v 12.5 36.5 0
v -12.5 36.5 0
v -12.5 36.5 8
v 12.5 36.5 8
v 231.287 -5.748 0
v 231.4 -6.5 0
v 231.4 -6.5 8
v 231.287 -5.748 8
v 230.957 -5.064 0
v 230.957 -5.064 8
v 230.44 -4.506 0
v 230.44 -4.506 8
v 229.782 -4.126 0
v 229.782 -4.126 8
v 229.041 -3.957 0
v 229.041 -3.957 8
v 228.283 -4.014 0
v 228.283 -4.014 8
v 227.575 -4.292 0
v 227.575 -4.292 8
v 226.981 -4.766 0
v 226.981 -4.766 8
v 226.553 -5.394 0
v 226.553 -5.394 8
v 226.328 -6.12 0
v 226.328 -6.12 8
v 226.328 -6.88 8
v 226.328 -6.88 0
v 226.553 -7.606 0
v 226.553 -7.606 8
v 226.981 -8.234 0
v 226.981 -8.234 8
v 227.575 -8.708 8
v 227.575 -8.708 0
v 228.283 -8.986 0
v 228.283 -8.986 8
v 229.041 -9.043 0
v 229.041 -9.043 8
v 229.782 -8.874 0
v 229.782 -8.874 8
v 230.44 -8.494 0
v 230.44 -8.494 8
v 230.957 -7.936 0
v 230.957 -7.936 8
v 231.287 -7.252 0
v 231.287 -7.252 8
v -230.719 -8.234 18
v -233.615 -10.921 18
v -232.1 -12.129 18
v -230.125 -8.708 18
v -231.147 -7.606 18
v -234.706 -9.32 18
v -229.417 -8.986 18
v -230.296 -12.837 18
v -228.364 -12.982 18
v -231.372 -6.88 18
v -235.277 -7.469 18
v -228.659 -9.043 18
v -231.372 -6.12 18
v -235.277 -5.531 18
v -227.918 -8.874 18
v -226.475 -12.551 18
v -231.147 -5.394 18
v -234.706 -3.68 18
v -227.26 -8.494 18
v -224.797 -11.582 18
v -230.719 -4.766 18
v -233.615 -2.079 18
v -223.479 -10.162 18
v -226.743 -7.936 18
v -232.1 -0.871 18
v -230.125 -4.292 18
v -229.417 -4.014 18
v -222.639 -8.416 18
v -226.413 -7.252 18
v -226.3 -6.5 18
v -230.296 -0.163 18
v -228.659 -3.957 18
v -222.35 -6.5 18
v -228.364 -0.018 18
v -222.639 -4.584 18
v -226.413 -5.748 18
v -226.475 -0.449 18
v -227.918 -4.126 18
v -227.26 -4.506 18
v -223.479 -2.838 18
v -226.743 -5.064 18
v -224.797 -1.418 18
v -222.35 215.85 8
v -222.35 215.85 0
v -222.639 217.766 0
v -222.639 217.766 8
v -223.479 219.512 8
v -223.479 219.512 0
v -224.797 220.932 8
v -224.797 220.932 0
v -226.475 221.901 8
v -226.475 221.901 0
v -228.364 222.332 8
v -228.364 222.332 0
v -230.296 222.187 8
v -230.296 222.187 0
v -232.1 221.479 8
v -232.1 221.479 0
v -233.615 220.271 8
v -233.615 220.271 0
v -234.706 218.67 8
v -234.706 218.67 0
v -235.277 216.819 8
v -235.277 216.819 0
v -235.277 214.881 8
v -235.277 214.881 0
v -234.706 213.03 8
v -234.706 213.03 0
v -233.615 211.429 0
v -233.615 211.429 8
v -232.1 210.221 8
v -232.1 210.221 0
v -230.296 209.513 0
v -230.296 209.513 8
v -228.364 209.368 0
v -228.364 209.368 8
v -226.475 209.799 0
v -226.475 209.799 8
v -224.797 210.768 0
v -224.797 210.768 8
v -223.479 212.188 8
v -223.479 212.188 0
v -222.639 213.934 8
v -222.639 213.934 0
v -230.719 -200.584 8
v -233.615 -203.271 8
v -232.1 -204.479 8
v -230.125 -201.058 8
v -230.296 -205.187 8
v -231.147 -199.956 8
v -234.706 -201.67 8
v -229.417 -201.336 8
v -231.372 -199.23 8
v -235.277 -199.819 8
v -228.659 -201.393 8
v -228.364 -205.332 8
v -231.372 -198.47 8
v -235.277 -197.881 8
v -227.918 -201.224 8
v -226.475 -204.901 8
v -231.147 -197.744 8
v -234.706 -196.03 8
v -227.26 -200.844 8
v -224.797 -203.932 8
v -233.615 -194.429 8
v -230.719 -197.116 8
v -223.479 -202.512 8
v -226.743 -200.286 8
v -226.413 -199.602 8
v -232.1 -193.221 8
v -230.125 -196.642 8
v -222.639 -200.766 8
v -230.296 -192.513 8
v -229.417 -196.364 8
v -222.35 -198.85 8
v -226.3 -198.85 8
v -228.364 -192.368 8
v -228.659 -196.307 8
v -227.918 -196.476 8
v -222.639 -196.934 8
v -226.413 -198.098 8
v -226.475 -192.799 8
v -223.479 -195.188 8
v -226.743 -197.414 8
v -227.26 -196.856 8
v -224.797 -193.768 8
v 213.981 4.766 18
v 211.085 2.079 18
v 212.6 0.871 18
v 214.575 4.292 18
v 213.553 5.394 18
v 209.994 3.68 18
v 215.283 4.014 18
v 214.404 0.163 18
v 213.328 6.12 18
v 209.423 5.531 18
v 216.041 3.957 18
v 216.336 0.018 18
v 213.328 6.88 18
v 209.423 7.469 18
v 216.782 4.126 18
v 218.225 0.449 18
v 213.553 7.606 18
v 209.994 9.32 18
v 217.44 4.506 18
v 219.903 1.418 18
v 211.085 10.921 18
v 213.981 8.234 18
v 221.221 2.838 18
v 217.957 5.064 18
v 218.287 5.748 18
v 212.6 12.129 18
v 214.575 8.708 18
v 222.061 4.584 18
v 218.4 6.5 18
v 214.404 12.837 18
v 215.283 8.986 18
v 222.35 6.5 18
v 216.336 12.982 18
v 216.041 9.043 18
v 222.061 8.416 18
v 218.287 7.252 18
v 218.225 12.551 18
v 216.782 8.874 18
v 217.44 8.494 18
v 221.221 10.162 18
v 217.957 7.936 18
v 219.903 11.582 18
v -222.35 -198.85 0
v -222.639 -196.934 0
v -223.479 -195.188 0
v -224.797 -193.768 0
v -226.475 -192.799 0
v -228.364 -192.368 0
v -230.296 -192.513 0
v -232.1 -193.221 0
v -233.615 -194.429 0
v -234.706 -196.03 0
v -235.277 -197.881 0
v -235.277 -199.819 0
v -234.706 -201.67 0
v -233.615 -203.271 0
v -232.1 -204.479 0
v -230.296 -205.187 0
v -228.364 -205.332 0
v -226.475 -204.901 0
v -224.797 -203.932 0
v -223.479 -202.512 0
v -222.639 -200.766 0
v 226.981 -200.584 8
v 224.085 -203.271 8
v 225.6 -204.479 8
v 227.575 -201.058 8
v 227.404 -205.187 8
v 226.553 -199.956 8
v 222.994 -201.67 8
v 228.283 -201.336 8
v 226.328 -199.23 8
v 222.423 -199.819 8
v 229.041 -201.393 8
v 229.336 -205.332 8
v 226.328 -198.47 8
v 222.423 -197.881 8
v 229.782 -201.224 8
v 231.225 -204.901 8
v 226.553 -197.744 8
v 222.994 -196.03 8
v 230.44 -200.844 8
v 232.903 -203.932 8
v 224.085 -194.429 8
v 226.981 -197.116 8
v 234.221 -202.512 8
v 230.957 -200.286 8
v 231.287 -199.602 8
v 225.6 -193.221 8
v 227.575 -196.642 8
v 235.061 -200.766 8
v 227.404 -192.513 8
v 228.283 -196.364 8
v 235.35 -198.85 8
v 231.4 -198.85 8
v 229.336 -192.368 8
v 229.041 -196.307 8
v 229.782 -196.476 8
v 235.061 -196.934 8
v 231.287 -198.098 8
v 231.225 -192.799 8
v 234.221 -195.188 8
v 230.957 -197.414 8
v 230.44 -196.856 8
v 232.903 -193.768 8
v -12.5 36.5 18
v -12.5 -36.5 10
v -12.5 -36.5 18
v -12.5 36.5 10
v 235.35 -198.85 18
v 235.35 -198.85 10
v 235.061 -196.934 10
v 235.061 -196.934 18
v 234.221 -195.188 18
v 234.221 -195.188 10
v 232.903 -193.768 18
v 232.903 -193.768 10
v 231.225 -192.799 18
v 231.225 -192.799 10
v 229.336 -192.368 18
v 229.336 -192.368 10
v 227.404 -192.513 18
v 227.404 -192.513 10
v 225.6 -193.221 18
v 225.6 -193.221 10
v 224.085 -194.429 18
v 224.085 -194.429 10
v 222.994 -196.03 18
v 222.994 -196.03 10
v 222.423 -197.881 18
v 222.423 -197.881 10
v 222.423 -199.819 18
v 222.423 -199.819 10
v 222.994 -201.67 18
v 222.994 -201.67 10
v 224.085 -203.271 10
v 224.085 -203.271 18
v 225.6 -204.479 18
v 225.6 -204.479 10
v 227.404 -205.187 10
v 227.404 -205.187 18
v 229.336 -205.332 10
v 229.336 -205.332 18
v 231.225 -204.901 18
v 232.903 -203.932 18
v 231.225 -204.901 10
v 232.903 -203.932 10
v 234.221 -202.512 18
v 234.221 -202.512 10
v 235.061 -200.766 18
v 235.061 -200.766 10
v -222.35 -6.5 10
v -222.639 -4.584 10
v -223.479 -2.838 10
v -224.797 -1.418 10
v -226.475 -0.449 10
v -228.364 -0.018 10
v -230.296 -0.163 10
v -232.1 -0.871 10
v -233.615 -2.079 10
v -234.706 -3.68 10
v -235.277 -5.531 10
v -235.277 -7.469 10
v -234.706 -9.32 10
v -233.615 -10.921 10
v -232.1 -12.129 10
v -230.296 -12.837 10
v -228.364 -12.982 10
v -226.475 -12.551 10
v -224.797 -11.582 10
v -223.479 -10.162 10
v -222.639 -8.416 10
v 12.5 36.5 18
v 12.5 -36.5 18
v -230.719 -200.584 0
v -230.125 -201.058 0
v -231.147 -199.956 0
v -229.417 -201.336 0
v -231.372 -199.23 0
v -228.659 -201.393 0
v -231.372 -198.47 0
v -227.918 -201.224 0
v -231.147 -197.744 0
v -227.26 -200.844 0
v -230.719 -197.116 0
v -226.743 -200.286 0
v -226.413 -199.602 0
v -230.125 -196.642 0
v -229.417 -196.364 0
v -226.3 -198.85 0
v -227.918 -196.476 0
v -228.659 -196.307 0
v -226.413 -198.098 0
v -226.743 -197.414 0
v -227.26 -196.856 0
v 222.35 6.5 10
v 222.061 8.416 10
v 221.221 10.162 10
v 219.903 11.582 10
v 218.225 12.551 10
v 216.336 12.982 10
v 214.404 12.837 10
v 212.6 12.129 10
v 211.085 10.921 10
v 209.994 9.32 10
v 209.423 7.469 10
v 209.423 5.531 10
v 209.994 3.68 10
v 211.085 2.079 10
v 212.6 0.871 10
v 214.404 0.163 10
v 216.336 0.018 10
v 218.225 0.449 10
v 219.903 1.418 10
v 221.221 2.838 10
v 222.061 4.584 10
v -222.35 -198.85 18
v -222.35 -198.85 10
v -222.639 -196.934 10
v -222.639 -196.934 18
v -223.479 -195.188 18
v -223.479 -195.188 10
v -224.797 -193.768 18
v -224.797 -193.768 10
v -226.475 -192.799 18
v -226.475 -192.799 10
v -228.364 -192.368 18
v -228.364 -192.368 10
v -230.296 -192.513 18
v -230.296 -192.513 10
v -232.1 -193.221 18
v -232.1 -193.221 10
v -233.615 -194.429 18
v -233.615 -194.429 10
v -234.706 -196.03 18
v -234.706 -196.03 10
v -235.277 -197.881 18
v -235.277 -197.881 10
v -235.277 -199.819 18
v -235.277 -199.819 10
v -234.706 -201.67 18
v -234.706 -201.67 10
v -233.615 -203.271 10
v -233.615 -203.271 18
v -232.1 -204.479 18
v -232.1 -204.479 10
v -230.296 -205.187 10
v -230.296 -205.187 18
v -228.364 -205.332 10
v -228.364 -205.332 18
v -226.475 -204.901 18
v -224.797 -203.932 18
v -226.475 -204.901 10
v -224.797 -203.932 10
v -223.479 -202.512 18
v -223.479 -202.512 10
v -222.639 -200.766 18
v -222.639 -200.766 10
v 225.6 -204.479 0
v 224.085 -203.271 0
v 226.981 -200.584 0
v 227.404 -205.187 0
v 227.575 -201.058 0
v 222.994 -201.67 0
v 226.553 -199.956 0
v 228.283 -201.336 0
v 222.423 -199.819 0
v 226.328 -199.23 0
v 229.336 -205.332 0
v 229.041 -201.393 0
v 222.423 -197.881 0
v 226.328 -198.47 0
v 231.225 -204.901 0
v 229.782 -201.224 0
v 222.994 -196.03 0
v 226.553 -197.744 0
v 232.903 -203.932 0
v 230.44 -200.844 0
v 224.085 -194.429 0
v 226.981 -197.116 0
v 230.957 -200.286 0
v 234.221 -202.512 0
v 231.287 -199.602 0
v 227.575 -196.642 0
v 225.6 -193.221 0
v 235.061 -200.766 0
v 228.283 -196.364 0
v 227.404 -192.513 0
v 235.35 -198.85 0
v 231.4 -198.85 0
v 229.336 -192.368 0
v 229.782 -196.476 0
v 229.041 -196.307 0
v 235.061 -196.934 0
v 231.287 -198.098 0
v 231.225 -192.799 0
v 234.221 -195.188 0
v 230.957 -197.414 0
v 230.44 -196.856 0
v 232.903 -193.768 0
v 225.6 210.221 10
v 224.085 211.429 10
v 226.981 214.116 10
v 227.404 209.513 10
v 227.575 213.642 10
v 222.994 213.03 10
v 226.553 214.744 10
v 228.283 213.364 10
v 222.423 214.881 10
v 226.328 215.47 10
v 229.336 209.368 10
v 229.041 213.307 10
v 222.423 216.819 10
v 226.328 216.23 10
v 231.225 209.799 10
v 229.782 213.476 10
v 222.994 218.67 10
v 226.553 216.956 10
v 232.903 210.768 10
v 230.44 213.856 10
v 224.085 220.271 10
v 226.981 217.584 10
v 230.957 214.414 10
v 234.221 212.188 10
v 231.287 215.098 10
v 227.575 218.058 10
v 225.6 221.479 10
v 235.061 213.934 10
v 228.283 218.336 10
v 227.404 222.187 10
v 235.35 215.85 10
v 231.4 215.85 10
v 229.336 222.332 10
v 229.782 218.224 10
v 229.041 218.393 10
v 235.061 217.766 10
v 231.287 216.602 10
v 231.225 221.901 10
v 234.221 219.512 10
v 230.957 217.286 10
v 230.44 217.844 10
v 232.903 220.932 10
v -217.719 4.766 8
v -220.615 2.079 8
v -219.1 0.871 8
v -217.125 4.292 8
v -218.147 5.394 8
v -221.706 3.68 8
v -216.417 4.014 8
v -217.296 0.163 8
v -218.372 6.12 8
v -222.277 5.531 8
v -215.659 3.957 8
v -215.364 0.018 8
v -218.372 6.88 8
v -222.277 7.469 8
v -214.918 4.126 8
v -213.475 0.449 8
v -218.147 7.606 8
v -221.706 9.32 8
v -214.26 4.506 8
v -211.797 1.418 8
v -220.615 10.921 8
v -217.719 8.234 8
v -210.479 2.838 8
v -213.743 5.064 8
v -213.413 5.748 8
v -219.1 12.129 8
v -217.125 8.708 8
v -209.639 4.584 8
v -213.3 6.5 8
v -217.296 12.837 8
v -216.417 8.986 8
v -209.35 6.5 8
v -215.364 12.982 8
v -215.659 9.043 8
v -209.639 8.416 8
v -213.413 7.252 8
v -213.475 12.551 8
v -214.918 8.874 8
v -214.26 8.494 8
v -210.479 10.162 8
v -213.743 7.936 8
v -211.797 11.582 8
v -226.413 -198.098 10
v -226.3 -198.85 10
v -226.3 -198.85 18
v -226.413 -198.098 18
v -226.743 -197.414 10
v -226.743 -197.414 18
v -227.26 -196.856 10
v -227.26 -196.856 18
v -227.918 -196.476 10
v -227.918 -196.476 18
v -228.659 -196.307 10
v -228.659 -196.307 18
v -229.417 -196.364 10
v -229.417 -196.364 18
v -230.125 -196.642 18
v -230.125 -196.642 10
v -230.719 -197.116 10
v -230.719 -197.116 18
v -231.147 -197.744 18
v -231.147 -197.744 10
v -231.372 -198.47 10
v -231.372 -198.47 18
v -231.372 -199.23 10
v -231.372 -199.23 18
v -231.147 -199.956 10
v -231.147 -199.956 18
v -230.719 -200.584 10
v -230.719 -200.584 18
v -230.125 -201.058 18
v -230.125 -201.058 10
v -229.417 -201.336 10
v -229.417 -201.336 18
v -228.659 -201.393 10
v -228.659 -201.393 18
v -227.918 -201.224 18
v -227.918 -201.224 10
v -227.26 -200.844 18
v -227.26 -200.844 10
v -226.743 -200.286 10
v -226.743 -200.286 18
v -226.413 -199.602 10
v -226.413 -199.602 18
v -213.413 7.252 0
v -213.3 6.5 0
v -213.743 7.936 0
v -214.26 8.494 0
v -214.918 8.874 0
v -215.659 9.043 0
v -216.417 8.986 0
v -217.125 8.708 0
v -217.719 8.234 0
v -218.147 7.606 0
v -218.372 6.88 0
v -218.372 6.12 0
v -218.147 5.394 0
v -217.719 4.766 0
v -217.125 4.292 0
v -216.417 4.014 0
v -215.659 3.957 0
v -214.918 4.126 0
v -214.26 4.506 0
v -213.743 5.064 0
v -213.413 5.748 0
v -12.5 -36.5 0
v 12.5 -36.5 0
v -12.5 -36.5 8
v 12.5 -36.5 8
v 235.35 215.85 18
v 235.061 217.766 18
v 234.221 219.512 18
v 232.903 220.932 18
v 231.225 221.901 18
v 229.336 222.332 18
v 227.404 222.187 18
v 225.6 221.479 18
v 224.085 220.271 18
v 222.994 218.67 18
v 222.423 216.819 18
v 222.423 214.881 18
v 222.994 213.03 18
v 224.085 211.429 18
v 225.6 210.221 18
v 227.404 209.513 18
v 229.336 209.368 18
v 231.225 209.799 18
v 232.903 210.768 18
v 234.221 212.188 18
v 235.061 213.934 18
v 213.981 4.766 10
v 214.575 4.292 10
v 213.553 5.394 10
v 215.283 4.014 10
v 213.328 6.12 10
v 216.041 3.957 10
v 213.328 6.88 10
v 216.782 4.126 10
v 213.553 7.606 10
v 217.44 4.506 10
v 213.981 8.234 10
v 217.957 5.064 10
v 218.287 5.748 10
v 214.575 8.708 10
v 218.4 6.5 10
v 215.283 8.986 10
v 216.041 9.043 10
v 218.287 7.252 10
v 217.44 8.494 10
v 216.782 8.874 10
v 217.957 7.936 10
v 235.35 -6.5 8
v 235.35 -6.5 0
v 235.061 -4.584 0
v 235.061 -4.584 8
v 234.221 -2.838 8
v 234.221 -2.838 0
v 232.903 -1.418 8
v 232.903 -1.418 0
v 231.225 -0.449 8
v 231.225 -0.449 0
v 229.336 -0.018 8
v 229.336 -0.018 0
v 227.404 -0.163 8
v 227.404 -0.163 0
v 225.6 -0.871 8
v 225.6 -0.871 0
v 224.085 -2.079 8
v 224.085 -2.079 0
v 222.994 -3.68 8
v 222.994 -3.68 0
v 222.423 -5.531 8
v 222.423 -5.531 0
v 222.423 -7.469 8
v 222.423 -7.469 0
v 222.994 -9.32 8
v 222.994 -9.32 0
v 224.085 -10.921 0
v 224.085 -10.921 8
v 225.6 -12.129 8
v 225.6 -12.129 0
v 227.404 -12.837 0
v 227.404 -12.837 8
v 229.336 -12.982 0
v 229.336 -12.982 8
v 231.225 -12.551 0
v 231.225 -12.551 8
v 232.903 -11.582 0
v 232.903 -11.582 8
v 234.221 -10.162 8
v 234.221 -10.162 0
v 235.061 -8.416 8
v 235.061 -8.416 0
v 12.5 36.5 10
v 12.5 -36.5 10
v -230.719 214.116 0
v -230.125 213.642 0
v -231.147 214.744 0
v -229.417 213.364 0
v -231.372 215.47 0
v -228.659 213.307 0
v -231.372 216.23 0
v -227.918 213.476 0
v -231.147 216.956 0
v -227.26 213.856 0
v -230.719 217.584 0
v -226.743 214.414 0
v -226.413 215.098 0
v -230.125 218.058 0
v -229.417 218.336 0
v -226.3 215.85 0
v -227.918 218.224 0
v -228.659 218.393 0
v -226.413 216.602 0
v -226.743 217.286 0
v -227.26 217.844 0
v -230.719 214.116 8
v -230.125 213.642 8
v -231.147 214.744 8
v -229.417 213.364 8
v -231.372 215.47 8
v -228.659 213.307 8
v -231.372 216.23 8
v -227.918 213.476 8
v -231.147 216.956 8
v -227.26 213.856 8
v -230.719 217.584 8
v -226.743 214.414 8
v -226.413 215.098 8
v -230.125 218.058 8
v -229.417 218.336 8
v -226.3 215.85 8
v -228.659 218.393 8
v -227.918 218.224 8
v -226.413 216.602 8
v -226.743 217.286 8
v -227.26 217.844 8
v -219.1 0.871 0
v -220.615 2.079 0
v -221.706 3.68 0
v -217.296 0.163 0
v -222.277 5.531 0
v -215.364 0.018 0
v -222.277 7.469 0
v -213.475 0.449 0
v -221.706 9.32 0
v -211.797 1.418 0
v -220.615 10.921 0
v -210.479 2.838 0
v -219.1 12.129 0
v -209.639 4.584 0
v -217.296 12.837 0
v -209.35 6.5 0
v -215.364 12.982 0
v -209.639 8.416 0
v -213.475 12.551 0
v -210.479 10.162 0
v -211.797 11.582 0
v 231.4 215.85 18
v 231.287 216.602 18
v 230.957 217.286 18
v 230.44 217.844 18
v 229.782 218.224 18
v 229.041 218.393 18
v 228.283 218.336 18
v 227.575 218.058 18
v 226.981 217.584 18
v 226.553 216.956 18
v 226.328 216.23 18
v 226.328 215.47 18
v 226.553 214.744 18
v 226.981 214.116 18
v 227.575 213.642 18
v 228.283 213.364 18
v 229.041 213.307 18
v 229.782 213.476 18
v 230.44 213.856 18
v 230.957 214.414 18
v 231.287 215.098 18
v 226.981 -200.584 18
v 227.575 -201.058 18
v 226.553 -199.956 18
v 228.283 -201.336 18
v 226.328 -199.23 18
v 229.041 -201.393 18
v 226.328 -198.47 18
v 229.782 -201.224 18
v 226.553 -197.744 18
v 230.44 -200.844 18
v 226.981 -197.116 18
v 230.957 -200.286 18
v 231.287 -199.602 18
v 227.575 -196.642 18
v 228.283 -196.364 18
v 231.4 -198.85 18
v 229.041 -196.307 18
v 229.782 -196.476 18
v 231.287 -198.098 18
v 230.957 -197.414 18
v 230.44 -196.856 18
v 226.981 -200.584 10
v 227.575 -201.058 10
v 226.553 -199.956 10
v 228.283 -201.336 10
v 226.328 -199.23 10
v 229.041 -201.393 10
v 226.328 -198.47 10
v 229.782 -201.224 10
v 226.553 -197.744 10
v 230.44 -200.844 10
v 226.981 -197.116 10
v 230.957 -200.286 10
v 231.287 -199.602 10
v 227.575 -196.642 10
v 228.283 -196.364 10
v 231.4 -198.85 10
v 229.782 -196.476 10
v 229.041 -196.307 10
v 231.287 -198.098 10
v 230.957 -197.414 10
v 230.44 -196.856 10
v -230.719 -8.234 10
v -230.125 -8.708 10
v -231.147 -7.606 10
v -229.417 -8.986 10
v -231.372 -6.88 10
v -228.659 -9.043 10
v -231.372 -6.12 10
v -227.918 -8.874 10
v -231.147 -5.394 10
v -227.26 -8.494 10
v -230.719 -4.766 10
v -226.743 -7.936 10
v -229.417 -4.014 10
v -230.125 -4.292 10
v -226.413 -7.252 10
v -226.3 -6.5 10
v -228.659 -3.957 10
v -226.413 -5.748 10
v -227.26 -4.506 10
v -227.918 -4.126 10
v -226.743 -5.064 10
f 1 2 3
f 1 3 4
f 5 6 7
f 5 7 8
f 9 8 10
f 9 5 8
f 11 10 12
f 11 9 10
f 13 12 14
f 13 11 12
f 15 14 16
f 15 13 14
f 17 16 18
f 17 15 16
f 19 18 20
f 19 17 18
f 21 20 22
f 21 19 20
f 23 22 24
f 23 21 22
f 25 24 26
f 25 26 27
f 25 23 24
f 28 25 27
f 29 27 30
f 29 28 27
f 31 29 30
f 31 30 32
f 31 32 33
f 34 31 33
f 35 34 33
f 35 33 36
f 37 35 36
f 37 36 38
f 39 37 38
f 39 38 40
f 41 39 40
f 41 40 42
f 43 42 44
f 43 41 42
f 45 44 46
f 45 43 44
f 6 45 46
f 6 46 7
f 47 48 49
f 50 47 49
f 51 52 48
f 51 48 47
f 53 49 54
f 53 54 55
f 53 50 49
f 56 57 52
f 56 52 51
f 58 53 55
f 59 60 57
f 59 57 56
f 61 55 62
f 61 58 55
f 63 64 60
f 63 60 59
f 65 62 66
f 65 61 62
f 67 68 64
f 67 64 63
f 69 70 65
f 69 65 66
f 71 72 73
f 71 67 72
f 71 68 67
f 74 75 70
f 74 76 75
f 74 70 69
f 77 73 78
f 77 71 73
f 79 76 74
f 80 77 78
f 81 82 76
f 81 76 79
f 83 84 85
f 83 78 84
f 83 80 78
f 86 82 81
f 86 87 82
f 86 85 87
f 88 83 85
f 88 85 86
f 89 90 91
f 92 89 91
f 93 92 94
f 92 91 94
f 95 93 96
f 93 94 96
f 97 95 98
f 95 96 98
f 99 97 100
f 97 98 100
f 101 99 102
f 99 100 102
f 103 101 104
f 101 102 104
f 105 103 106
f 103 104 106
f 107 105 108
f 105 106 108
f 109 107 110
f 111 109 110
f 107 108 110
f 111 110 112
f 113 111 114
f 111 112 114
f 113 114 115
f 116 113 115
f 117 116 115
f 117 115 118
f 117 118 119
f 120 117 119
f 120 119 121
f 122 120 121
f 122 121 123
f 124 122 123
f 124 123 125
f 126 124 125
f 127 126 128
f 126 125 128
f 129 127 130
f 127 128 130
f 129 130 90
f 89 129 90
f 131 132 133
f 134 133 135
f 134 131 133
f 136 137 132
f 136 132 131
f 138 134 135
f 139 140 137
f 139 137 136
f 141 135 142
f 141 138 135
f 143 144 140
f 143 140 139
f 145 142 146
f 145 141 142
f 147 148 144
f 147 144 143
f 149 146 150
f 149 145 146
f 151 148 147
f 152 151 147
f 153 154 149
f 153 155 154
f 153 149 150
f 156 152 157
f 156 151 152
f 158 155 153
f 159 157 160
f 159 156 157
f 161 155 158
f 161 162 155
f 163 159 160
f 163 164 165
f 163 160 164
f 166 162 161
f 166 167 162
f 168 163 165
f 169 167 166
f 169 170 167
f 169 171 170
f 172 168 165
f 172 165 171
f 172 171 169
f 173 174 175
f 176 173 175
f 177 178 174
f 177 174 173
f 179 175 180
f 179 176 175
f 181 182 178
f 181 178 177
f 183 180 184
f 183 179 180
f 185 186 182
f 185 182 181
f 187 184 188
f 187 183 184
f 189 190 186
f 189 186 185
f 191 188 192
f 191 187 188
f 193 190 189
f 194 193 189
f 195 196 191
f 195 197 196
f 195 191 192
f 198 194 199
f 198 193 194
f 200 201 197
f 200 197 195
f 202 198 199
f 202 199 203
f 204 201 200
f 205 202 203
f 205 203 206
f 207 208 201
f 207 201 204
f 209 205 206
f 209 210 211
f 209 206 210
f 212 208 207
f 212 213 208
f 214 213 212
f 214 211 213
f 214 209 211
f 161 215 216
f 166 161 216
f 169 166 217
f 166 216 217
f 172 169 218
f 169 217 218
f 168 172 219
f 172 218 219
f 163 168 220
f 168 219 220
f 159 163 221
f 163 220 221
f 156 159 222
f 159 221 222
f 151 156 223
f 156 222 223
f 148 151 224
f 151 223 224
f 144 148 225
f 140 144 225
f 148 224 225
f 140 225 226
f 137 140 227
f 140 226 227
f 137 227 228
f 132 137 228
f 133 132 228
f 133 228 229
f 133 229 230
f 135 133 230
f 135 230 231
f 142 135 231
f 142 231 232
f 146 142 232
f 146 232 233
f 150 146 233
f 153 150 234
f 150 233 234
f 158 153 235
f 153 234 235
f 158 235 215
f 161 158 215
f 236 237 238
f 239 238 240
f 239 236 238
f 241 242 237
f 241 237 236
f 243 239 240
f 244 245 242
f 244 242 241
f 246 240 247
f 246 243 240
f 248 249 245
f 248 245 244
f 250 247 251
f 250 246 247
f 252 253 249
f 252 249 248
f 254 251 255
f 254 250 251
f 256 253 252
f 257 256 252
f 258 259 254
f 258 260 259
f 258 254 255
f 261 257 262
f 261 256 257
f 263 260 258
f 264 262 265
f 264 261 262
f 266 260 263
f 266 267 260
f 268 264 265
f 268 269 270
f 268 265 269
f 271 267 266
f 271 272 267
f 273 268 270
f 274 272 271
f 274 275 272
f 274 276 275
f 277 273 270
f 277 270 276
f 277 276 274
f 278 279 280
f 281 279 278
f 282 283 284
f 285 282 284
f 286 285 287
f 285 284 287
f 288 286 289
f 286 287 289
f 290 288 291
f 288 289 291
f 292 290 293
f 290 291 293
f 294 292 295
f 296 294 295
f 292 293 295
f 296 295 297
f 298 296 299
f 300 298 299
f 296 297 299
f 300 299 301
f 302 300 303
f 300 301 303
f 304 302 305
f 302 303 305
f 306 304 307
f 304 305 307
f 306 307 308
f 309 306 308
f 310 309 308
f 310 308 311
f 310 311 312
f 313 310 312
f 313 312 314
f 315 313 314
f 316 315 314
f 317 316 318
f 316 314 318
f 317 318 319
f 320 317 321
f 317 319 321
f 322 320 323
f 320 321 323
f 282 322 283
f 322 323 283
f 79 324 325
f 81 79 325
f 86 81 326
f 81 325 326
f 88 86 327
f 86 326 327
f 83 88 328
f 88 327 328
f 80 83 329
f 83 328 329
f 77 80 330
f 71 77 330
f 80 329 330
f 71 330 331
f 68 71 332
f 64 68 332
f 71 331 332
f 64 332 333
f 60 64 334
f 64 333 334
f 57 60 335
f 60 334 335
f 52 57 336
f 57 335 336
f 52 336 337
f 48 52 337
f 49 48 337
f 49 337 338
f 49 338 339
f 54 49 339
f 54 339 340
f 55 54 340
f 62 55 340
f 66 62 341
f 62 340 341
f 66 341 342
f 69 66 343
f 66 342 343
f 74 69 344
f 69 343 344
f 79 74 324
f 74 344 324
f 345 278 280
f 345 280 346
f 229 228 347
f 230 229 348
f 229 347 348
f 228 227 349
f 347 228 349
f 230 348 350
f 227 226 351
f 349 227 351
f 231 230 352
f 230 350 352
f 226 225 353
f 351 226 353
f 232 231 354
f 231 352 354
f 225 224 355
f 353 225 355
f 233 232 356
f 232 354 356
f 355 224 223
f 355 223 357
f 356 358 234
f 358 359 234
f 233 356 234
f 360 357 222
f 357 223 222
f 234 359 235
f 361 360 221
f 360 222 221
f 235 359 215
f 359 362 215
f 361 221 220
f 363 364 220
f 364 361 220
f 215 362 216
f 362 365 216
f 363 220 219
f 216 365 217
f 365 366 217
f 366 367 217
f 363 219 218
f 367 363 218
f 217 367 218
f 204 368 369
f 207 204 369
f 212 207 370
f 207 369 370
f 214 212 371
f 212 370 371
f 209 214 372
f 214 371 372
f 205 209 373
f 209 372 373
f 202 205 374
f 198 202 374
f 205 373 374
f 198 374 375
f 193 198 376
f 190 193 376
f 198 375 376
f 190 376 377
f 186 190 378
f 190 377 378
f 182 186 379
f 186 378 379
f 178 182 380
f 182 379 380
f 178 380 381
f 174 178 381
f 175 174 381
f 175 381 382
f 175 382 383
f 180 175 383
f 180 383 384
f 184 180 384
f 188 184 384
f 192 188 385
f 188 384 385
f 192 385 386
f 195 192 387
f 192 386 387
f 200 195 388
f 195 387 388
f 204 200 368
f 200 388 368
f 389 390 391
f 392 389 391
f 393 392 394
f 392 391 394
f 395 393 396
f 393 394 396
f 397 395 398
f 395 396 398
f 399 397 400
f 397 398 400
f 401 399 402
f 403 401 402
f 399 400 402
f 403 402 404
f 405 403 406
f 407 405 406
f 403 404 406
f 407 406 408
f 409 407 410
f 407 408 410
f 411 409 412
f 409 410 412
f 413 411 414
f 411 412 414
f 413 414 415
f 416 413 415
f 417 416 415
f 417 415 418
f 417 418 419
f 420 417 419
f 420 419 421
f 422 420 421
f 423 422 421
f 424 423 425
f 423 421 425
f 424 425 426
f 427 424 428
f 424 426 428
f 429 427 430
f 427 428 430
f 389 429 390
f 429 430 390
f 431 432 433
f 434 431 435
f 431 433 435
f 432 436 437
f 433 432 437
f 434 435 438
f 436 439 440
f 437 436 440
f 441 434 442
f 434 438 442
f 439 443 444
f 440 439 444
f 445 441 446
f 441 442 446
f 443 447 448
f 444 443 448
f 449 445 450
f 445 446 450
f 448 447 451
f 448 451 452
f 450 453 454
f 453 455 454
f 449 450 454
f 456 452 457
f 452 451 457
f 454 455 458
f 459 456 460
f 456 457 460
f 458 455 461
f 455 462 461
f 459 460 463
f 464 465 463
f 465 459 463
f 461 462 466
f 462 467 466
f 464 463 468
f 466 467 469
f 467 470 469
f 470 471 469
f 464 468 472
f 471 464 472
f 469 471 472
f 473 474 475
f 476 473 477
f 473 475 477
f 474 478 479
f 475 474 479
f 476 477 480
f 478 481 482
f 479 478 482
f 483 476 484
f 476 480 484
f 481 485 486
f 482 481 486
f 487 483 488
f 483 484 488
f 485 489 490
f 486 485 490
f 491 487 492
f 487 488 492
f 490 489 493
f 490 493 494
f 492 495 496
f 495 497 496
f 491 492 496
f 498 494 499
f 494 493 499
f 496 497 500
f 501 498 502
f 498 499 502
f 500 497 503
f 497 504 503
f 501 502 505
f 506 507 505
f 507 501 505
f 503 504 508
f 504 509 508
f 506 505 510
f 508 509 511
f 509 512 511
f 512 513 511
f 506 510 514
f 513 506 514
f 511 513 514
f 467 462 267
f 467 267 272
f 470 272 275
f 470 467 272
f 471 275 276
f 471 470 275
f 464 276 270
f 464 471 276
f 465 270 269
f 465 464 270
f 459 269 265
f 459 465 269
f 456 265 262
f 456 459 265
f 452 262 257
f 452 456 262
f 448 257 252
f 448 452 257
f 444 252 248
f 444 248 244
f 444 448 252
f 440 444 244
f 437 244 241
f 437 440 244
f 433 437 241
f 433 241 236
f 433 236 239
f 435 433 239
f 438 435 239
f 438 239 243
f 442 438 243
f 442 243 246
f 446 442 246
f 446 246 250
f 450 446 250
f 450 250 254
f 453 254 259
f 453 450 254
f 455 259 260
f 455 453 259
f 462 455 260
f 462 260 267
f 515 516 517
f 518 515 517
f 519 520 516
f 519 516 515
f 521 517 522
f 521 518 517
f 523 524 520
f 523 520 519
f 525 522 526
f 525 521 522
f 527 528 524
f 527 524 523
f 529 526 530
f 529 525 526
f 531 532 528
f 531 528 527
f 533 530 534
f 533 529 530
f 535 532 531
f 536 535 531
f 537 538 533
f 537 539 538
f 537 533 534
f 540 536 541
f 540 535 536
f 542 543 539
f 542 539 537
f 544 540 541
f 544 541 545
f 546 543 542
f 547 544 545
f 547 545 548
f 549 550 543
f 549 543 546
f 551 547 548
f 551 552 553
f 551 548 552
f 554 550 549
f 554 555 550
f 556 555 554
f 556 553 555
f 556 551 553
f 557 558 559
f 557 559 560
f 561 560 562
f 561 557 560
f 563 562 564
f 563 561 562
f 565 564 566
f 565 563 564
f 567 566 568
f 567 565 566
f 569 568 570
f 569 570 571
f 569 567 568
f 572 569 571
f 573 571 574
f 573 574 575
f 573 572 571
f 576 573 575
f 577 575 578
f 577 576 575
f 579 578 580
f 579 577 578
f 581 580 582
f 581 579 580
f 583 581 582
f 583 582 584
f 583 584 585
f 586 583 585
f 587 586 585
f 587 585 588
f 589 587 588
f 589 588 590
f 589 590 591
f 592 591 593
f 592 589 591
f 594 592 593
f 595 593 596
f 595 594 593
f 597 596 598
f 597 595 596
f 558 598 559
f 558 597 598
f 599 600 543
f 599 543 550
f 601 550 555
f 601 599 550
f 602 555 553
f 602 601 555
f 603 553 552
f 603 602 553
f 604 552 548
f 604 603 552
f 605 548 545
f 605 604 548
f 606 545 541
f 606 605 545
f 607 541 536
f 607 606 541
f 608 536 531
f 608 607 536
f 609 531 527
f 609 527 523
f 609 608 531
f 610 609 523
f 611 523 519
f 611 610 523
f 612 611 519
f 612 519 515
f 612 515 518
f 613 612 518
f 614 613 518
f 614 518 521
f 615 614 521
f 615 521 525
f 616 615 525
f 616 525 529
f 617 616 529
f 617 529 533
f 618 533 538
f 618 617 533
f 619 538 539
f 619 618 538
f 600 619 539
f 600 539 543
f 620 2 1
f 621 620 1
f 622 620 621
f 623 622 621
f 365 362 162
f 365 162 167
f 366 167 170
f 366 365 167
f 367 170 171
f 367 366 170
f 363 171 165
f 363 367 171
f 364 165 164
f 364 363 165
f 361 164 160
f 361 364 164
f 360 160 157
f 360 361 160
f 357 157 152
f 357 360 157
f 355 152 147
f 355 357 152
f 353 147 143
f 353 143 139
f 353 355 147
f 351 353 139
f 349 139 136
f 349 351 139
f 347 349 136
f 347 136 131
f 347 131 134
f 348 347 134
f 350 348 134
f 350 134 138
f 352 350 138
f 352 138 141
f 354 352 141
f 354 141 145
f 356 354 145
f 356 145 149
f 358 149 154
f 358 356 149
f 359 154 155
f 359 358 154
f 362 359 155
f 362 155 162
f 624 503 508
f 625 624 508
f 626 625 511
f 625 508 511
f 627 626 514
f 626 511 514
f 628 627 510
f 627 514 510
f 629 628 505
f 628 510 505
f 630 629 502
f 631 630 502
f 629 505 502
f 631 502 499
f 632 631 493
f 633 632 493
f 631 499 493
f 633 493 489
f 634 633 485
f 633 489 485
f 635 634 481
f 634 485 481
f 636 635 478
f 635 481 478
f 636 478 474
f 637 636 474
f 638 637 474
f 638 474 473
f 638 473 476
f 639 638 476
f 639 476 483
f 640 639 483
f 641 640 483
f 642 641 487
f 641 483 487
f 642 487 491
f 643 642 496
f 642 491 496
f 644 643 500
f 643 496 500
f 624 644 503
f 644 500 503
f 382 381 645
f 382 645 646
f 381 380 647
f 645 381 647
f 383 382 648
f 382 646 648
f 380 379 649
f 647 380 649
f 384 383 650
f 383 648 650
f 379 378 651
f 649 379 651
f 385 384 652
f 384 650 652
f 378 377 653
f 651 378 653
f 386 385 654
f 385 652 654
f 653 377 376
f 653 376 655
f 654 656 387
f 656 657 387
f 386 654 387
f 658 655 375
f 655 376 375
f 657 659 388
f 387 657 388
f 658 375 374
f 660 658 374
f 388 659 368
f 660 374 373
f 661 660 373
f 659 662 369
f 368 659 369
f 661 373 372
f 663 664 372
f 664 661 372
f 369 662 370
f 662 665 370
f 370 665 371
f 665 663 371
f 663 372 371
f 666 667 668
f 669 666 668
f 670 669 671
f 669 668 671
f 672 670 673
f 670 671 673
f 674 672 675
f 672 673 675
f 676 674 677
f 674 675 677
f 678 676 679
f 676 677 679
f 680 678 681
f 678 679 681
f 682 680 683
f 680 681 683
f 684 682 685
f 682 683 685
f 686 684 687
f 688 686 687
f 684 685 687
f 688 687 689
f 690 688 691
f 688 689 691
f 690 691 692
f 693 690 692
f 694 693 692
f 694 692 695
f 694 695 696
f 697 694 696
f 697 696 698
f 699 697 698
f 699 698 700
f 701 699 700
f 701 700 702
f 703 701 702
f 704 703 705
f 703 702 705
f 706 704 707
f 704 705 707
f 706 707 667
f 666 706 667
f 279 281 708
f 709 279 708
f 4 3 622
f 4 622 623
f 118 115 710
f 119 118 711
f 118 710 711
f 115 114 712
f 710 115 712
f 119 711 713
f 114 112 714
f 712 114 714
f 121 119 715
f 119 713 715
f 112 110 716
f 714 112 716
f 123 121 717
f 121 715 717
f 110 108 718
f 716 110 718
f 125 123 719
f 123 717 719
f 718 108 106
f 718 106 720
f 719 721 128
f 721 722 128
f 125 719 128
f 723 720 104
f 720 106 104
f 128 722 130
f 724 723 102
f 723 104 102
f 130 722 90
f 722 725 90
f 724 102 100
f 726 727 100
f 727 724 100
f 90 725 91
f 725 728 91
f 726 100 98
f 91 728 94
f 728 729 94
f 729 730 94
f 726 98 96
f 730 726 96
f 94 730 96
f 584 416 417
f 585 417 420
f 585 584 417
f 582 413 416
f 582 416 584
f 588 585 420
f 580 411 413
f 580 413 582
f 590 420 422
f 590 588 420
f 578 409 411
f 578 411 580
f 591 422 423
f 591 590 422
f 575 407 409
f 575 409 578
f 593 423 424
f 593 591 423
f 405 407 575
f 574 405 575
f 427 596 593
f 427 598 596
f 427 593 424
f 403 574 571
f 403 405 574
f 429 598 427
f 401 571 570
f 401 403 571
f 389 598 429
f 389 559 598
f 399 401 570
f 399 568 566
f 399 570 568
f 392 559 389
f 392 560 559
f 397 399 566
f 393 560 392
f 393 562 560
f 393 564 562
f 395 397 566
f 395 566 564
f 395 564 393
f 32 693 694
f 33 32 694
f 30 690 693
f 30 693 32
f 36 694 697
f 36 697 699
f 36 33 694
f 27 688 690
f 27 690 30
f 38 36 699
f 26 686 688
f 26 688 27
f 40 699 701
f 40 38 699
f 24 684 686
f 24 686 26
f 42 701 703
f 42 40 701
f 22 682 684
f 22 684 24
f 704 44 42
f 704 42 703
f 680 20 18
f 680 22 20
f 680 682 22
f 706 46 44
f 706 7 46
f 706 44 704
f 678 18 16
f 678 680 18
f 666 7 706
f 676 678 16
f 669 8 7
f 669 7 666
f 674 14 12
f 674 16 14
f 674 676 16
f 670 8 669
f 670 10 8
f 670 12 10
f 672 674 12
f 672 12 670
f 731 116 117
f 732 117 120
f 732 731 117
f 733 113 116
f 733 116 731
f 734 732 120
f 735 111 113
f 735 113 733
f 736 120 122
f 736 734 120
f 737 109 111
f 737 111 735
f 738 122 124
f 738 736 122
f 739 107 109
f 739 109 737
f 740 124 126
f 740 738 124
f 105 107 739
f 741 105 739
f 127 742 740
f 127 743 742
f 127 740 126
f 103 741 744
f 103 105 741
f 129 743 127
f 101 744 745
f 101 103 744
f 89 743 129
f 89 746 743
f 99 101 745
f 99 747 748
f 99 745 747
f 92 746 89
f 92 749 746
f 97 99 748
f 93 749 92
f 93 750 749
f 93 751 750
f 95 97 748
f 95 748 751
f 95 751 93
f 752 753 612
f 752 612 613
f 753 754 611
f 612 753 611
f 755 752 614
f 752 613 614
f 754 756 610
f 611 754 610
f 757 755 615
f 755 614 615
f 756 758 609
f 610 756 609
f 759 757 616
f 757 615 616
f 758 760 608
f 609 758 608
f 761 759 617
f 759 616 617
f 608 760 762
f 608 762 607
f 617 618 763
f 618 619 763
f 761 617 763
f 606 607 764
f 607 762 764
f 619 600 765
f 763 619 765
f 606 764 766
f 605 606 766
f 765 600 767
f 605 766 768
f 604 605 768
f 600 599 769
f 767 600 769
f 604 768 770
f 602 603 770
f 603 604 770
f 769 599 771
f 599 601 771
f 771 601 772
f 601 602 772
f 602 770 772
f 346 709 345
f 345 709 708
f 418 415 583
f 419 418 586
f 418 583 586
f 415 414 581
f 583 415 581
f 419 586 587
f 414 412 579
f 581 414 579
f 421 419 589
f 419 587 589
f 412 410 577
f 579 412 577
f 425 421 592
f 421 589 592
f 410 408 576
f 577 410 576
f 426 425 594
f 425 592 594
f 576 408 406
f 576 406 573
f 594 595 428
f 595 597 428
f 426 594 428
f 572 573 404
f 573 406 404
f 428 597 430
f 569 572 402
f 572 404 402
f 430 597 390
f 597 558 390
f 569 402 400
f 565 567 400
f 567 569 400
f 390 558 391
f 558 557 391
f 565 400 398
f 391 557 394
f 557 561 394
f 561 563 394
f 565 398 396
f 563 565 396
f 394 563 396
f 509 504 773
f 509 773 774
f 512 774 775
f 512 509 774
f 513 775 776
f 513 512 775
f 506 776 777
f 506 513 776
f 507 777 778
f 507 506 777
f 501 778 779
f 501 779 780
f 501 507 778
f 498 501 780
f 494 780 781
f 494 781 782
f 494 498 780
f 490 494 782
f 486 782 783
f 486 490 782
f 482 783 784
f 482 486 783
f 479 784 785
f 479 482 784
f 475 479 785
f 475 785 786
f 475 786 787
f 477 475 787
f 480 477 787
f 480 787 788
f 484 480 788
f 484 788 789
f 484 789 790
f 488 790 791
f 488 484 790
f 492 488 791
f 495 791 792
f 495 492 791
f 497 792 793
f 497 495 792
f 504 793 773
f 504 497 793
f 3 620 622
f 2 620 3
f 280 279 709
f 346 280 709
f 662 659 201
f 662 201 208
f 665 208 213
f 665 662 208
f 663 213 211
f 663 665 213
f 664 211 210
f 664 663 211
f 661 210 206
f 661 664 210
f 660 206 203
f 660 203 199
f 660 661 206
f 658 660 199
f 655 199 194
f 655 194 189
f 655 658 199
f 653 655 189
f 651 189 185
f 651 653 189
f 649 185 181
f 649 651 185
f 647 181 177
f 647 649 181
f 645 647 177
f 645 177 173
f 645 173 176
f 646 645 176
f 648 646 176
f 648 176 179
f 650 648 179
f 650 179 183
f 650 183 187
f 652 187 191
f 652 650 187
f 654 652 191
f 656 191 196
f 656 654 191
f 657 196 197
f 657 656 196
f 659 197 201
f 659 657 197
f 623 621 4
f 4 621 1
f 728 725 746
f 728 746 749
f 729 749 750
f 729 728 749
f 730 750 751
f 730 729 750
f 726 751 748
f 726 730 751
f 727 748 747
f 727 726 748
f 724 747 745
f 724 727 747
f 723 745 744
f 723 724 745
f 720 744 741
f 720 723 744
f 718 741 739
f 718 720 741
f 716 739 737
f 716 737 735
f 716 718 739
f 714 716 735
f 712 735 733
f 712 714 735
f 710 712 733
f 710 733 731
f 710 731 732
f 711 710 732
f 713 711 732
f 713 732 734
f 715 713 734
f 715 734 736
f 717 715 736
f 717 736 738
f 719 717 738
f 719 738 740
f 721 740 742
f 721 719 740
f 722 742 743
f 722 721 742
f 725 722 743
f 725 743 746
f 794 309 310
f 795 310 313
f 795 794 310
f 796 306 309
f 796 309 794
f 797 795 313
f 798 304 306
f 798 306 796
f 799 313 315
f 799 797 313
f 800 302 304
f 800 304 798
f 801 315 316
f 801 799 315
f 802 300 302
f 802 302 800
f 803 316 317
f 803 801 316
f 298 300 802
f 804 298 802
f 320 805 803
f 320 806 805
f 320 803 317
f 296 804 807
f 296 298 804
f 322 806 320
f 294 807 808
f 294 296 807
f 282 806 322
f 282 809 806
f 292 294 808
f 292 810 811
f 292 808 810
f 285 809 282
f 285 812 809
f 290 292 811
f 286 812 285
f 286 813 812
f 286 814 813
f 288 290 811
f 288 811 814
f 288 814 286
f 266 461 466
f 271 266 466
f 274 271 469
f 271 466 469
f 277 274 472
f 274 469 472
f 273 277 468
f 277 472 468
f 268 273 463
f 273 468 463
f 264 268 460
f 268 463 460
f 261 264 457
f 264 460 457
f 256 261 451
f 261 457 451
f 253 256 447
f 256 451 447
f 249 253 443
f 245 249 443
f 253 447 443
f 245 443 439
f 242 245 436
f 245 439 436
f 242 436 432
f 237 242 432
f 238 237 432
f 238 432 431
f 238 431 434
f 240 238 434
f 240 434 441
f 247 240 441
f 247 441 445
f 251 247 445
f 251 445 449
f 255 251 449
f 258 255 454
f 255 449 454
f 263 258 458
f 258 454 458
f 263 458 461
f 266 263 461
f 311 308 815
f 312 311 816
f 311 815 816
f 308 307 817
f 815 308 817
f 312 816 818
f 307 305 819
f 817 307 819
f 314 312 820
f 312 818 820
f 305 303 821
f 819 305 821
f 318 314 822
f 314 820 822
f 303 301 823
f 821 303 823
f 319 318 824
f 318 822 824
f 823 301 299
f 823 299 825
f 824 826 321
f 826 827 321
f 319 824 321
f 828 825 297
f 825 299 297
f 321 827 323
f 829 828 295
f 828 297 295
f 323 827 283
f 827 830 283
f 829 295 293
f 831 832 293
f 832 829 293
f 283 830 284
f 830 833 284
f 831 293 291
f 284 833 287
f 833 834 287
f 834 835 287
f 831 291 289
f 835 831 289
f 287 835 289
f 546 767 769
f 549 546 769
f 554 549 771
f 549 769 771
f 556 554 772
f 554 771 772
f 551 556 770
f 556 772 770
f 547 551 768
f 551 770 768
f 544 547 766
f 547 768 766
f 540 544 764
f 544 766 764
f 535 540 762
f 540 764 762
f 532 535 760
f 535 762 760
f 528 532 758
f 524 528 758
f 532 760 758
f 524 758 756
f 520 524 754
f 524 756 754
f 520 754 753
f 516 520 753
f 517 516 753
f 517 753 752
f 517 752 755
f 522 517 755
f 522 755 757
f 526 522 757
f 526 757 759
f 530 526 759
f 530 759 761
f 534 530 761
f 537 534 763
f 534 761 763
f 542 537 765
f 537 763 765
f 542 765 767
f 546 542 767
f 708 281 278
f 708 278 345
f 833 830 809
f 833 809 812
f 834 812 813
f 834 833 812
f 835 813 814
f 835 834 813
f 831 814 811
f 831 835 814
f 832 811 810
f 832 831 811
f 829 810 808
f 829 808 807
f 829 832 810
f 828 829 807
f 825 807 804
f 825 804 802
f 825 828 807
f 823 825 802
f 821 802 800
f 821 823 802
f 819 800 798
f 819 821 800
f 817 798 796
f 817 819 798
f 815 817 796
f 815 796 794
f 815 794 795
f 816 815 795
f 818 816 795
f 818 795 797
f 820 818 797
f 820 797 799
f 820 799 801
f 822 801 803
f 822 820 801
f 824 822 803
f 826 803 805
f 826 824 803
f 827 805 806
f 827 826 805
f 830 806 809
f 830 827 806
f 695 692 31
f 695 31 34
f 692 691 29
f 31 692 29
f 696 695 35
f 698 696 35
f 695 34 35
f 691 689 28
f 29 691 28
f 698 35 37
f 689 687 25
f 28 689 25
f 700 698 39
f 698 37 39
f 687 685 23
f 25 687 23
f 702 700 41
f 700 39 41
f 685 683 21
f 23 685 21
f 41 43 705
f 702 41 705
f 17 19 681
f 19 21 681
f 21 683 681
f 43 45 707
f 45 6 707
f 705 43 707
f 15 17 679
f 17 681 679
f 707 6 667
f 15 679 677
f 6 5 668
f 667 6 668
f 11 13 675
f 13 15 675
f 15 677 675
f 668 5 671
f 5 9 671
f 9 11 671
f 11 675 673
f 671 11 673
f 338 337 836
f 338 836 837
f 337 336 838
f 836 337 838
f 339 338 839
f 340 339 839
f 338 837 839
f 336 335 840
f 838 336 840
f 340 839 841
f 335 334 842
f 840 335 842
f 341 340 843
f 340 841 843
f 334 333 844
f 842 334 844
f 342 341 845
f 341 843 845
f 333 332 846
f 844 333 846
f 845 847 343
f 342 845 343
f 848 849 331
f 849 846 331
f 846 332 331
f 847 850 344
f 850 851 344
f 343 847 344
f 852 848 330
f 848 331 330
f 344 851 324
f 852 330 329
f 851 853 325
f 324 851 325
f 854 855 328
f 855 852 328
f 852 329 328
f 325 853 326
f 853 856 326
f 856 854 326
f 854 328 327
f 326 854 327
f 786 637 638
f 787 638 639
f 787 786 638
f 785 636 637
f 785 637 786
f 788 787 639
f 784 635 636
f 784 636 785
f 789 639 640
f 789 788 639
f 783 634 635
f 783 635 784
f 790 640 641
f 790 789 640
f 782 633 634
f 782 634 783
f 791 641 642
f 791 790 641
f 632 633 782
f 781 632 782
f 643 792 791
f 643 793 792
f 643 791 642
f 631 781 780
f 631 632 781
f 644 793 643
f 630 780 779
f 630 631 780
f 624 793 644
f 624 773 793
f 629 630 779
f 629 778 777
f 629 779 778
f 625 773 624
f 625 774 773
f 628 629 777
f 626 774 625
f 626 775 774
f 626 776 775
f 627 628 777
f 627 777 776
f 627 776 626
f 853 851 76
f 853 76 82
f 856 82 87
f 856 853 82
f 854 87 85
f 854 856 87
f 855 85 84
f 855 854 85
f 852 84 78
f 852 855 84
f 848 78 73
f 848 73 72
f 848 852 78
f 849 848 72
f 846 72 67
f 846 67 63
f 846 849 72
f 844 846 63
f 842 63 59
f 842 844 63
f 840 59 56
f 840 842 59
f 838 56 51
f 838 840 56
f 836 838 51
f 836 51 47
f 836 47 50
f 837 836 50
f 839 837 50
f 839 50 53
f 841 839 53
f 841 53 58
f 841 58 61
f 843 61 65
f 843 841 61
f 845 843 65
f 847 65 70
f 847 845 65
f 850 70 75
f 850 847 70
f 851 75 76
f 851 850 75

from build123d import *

# Parameters (mm, degrees)
F4_R     = 6.5
F4_R_2   = 2.55
F4_W     = 25
F4_H     = 73
F5_DEPTH = 8
F7_R     = 6.5
F7_R_2   = 2.55
F7_W     = 25
F7_H     = 73
F8_DEPTH = 8


with BuildPart() as f5:
    # F4 (on Top) → F5 (new body)
    with BuildSketch(Plane.XY):
        with Locations((-228.85, 215.85)):
            Circle(F4_R)
        with Locations((-228.85, 215.85)):
            Circle(F4_R_2, mode=Mode.SUBTRACT)
        with Locations((-228.85, -198.85)):
            Circle(F4_R)
        with Locations((-228.85, -198.85)):
            Circle(F4_R_2, mode=Mode.SUBTRACT)
        with Locations((228.85, -198.85)):
            Circle(F4_R)
        with Locations((228.85, -198.85)):
            Circle(F4_R_2, mode=Mode.SUBTRACT)
        Rectangle(F4_W, F4_H)
        with Locations((-215.85, 6.5)):
            Circle(F4_R)
        with Locations((-215.85, 6.5)):
            Circle(F4_R_2, mode=Mode.SUBTRACT)
        with Locations((228.85, -6.5)):
            Circle(F4_R)
        with Locations((228.85, -6.5)):
            Circle(F4_R_2, mode=Mode.SUBTRACT)
    extrude(amount=F5_DEPTH)


with BuildPart() as f8:
    # F7 (on offset) → F8 (new body)
    with BuildSketch(Plane.XY.offset(10)):
        with Locations((228.85, 215.85)):
            Circle(F7_R)
        with Locations((228.85, 215.85)):
            Circle(F7_R_2, mode=Mode.SUBTRACT)
        with Locations((-228.85, -198.85)):
            Circle(F7_R)
        with Locations((-228.85, -198.85)):
            Circle(F7_R_2, mode=Mode.SUBTRACT)
        with Locations((228.85, -198.85)):
            Circle(F7_R)
        with Locations((228.85, -198.85)):
            Circle(F7_R_2, mode=Mode.SUBTRACT)
        Rectangle(F7_W, F7_H)
        with Locations((-228.85, -6.5)):
            Circle(F7_R)
        with Locations((-228.85, -6.5)):
            Circle(F7_R_2, mode=Mode.SUBTRACT)
        with Locations((215.85, 6.5)):
            Circle(F7_R)
        with Locations((215.85, 6.5)):
            Circle(F7_R_2, mode=Mode.SUBTRACT)
    extrude(amount=F8_DEPTH)


solid = Compound([f5.part, f8.part])
